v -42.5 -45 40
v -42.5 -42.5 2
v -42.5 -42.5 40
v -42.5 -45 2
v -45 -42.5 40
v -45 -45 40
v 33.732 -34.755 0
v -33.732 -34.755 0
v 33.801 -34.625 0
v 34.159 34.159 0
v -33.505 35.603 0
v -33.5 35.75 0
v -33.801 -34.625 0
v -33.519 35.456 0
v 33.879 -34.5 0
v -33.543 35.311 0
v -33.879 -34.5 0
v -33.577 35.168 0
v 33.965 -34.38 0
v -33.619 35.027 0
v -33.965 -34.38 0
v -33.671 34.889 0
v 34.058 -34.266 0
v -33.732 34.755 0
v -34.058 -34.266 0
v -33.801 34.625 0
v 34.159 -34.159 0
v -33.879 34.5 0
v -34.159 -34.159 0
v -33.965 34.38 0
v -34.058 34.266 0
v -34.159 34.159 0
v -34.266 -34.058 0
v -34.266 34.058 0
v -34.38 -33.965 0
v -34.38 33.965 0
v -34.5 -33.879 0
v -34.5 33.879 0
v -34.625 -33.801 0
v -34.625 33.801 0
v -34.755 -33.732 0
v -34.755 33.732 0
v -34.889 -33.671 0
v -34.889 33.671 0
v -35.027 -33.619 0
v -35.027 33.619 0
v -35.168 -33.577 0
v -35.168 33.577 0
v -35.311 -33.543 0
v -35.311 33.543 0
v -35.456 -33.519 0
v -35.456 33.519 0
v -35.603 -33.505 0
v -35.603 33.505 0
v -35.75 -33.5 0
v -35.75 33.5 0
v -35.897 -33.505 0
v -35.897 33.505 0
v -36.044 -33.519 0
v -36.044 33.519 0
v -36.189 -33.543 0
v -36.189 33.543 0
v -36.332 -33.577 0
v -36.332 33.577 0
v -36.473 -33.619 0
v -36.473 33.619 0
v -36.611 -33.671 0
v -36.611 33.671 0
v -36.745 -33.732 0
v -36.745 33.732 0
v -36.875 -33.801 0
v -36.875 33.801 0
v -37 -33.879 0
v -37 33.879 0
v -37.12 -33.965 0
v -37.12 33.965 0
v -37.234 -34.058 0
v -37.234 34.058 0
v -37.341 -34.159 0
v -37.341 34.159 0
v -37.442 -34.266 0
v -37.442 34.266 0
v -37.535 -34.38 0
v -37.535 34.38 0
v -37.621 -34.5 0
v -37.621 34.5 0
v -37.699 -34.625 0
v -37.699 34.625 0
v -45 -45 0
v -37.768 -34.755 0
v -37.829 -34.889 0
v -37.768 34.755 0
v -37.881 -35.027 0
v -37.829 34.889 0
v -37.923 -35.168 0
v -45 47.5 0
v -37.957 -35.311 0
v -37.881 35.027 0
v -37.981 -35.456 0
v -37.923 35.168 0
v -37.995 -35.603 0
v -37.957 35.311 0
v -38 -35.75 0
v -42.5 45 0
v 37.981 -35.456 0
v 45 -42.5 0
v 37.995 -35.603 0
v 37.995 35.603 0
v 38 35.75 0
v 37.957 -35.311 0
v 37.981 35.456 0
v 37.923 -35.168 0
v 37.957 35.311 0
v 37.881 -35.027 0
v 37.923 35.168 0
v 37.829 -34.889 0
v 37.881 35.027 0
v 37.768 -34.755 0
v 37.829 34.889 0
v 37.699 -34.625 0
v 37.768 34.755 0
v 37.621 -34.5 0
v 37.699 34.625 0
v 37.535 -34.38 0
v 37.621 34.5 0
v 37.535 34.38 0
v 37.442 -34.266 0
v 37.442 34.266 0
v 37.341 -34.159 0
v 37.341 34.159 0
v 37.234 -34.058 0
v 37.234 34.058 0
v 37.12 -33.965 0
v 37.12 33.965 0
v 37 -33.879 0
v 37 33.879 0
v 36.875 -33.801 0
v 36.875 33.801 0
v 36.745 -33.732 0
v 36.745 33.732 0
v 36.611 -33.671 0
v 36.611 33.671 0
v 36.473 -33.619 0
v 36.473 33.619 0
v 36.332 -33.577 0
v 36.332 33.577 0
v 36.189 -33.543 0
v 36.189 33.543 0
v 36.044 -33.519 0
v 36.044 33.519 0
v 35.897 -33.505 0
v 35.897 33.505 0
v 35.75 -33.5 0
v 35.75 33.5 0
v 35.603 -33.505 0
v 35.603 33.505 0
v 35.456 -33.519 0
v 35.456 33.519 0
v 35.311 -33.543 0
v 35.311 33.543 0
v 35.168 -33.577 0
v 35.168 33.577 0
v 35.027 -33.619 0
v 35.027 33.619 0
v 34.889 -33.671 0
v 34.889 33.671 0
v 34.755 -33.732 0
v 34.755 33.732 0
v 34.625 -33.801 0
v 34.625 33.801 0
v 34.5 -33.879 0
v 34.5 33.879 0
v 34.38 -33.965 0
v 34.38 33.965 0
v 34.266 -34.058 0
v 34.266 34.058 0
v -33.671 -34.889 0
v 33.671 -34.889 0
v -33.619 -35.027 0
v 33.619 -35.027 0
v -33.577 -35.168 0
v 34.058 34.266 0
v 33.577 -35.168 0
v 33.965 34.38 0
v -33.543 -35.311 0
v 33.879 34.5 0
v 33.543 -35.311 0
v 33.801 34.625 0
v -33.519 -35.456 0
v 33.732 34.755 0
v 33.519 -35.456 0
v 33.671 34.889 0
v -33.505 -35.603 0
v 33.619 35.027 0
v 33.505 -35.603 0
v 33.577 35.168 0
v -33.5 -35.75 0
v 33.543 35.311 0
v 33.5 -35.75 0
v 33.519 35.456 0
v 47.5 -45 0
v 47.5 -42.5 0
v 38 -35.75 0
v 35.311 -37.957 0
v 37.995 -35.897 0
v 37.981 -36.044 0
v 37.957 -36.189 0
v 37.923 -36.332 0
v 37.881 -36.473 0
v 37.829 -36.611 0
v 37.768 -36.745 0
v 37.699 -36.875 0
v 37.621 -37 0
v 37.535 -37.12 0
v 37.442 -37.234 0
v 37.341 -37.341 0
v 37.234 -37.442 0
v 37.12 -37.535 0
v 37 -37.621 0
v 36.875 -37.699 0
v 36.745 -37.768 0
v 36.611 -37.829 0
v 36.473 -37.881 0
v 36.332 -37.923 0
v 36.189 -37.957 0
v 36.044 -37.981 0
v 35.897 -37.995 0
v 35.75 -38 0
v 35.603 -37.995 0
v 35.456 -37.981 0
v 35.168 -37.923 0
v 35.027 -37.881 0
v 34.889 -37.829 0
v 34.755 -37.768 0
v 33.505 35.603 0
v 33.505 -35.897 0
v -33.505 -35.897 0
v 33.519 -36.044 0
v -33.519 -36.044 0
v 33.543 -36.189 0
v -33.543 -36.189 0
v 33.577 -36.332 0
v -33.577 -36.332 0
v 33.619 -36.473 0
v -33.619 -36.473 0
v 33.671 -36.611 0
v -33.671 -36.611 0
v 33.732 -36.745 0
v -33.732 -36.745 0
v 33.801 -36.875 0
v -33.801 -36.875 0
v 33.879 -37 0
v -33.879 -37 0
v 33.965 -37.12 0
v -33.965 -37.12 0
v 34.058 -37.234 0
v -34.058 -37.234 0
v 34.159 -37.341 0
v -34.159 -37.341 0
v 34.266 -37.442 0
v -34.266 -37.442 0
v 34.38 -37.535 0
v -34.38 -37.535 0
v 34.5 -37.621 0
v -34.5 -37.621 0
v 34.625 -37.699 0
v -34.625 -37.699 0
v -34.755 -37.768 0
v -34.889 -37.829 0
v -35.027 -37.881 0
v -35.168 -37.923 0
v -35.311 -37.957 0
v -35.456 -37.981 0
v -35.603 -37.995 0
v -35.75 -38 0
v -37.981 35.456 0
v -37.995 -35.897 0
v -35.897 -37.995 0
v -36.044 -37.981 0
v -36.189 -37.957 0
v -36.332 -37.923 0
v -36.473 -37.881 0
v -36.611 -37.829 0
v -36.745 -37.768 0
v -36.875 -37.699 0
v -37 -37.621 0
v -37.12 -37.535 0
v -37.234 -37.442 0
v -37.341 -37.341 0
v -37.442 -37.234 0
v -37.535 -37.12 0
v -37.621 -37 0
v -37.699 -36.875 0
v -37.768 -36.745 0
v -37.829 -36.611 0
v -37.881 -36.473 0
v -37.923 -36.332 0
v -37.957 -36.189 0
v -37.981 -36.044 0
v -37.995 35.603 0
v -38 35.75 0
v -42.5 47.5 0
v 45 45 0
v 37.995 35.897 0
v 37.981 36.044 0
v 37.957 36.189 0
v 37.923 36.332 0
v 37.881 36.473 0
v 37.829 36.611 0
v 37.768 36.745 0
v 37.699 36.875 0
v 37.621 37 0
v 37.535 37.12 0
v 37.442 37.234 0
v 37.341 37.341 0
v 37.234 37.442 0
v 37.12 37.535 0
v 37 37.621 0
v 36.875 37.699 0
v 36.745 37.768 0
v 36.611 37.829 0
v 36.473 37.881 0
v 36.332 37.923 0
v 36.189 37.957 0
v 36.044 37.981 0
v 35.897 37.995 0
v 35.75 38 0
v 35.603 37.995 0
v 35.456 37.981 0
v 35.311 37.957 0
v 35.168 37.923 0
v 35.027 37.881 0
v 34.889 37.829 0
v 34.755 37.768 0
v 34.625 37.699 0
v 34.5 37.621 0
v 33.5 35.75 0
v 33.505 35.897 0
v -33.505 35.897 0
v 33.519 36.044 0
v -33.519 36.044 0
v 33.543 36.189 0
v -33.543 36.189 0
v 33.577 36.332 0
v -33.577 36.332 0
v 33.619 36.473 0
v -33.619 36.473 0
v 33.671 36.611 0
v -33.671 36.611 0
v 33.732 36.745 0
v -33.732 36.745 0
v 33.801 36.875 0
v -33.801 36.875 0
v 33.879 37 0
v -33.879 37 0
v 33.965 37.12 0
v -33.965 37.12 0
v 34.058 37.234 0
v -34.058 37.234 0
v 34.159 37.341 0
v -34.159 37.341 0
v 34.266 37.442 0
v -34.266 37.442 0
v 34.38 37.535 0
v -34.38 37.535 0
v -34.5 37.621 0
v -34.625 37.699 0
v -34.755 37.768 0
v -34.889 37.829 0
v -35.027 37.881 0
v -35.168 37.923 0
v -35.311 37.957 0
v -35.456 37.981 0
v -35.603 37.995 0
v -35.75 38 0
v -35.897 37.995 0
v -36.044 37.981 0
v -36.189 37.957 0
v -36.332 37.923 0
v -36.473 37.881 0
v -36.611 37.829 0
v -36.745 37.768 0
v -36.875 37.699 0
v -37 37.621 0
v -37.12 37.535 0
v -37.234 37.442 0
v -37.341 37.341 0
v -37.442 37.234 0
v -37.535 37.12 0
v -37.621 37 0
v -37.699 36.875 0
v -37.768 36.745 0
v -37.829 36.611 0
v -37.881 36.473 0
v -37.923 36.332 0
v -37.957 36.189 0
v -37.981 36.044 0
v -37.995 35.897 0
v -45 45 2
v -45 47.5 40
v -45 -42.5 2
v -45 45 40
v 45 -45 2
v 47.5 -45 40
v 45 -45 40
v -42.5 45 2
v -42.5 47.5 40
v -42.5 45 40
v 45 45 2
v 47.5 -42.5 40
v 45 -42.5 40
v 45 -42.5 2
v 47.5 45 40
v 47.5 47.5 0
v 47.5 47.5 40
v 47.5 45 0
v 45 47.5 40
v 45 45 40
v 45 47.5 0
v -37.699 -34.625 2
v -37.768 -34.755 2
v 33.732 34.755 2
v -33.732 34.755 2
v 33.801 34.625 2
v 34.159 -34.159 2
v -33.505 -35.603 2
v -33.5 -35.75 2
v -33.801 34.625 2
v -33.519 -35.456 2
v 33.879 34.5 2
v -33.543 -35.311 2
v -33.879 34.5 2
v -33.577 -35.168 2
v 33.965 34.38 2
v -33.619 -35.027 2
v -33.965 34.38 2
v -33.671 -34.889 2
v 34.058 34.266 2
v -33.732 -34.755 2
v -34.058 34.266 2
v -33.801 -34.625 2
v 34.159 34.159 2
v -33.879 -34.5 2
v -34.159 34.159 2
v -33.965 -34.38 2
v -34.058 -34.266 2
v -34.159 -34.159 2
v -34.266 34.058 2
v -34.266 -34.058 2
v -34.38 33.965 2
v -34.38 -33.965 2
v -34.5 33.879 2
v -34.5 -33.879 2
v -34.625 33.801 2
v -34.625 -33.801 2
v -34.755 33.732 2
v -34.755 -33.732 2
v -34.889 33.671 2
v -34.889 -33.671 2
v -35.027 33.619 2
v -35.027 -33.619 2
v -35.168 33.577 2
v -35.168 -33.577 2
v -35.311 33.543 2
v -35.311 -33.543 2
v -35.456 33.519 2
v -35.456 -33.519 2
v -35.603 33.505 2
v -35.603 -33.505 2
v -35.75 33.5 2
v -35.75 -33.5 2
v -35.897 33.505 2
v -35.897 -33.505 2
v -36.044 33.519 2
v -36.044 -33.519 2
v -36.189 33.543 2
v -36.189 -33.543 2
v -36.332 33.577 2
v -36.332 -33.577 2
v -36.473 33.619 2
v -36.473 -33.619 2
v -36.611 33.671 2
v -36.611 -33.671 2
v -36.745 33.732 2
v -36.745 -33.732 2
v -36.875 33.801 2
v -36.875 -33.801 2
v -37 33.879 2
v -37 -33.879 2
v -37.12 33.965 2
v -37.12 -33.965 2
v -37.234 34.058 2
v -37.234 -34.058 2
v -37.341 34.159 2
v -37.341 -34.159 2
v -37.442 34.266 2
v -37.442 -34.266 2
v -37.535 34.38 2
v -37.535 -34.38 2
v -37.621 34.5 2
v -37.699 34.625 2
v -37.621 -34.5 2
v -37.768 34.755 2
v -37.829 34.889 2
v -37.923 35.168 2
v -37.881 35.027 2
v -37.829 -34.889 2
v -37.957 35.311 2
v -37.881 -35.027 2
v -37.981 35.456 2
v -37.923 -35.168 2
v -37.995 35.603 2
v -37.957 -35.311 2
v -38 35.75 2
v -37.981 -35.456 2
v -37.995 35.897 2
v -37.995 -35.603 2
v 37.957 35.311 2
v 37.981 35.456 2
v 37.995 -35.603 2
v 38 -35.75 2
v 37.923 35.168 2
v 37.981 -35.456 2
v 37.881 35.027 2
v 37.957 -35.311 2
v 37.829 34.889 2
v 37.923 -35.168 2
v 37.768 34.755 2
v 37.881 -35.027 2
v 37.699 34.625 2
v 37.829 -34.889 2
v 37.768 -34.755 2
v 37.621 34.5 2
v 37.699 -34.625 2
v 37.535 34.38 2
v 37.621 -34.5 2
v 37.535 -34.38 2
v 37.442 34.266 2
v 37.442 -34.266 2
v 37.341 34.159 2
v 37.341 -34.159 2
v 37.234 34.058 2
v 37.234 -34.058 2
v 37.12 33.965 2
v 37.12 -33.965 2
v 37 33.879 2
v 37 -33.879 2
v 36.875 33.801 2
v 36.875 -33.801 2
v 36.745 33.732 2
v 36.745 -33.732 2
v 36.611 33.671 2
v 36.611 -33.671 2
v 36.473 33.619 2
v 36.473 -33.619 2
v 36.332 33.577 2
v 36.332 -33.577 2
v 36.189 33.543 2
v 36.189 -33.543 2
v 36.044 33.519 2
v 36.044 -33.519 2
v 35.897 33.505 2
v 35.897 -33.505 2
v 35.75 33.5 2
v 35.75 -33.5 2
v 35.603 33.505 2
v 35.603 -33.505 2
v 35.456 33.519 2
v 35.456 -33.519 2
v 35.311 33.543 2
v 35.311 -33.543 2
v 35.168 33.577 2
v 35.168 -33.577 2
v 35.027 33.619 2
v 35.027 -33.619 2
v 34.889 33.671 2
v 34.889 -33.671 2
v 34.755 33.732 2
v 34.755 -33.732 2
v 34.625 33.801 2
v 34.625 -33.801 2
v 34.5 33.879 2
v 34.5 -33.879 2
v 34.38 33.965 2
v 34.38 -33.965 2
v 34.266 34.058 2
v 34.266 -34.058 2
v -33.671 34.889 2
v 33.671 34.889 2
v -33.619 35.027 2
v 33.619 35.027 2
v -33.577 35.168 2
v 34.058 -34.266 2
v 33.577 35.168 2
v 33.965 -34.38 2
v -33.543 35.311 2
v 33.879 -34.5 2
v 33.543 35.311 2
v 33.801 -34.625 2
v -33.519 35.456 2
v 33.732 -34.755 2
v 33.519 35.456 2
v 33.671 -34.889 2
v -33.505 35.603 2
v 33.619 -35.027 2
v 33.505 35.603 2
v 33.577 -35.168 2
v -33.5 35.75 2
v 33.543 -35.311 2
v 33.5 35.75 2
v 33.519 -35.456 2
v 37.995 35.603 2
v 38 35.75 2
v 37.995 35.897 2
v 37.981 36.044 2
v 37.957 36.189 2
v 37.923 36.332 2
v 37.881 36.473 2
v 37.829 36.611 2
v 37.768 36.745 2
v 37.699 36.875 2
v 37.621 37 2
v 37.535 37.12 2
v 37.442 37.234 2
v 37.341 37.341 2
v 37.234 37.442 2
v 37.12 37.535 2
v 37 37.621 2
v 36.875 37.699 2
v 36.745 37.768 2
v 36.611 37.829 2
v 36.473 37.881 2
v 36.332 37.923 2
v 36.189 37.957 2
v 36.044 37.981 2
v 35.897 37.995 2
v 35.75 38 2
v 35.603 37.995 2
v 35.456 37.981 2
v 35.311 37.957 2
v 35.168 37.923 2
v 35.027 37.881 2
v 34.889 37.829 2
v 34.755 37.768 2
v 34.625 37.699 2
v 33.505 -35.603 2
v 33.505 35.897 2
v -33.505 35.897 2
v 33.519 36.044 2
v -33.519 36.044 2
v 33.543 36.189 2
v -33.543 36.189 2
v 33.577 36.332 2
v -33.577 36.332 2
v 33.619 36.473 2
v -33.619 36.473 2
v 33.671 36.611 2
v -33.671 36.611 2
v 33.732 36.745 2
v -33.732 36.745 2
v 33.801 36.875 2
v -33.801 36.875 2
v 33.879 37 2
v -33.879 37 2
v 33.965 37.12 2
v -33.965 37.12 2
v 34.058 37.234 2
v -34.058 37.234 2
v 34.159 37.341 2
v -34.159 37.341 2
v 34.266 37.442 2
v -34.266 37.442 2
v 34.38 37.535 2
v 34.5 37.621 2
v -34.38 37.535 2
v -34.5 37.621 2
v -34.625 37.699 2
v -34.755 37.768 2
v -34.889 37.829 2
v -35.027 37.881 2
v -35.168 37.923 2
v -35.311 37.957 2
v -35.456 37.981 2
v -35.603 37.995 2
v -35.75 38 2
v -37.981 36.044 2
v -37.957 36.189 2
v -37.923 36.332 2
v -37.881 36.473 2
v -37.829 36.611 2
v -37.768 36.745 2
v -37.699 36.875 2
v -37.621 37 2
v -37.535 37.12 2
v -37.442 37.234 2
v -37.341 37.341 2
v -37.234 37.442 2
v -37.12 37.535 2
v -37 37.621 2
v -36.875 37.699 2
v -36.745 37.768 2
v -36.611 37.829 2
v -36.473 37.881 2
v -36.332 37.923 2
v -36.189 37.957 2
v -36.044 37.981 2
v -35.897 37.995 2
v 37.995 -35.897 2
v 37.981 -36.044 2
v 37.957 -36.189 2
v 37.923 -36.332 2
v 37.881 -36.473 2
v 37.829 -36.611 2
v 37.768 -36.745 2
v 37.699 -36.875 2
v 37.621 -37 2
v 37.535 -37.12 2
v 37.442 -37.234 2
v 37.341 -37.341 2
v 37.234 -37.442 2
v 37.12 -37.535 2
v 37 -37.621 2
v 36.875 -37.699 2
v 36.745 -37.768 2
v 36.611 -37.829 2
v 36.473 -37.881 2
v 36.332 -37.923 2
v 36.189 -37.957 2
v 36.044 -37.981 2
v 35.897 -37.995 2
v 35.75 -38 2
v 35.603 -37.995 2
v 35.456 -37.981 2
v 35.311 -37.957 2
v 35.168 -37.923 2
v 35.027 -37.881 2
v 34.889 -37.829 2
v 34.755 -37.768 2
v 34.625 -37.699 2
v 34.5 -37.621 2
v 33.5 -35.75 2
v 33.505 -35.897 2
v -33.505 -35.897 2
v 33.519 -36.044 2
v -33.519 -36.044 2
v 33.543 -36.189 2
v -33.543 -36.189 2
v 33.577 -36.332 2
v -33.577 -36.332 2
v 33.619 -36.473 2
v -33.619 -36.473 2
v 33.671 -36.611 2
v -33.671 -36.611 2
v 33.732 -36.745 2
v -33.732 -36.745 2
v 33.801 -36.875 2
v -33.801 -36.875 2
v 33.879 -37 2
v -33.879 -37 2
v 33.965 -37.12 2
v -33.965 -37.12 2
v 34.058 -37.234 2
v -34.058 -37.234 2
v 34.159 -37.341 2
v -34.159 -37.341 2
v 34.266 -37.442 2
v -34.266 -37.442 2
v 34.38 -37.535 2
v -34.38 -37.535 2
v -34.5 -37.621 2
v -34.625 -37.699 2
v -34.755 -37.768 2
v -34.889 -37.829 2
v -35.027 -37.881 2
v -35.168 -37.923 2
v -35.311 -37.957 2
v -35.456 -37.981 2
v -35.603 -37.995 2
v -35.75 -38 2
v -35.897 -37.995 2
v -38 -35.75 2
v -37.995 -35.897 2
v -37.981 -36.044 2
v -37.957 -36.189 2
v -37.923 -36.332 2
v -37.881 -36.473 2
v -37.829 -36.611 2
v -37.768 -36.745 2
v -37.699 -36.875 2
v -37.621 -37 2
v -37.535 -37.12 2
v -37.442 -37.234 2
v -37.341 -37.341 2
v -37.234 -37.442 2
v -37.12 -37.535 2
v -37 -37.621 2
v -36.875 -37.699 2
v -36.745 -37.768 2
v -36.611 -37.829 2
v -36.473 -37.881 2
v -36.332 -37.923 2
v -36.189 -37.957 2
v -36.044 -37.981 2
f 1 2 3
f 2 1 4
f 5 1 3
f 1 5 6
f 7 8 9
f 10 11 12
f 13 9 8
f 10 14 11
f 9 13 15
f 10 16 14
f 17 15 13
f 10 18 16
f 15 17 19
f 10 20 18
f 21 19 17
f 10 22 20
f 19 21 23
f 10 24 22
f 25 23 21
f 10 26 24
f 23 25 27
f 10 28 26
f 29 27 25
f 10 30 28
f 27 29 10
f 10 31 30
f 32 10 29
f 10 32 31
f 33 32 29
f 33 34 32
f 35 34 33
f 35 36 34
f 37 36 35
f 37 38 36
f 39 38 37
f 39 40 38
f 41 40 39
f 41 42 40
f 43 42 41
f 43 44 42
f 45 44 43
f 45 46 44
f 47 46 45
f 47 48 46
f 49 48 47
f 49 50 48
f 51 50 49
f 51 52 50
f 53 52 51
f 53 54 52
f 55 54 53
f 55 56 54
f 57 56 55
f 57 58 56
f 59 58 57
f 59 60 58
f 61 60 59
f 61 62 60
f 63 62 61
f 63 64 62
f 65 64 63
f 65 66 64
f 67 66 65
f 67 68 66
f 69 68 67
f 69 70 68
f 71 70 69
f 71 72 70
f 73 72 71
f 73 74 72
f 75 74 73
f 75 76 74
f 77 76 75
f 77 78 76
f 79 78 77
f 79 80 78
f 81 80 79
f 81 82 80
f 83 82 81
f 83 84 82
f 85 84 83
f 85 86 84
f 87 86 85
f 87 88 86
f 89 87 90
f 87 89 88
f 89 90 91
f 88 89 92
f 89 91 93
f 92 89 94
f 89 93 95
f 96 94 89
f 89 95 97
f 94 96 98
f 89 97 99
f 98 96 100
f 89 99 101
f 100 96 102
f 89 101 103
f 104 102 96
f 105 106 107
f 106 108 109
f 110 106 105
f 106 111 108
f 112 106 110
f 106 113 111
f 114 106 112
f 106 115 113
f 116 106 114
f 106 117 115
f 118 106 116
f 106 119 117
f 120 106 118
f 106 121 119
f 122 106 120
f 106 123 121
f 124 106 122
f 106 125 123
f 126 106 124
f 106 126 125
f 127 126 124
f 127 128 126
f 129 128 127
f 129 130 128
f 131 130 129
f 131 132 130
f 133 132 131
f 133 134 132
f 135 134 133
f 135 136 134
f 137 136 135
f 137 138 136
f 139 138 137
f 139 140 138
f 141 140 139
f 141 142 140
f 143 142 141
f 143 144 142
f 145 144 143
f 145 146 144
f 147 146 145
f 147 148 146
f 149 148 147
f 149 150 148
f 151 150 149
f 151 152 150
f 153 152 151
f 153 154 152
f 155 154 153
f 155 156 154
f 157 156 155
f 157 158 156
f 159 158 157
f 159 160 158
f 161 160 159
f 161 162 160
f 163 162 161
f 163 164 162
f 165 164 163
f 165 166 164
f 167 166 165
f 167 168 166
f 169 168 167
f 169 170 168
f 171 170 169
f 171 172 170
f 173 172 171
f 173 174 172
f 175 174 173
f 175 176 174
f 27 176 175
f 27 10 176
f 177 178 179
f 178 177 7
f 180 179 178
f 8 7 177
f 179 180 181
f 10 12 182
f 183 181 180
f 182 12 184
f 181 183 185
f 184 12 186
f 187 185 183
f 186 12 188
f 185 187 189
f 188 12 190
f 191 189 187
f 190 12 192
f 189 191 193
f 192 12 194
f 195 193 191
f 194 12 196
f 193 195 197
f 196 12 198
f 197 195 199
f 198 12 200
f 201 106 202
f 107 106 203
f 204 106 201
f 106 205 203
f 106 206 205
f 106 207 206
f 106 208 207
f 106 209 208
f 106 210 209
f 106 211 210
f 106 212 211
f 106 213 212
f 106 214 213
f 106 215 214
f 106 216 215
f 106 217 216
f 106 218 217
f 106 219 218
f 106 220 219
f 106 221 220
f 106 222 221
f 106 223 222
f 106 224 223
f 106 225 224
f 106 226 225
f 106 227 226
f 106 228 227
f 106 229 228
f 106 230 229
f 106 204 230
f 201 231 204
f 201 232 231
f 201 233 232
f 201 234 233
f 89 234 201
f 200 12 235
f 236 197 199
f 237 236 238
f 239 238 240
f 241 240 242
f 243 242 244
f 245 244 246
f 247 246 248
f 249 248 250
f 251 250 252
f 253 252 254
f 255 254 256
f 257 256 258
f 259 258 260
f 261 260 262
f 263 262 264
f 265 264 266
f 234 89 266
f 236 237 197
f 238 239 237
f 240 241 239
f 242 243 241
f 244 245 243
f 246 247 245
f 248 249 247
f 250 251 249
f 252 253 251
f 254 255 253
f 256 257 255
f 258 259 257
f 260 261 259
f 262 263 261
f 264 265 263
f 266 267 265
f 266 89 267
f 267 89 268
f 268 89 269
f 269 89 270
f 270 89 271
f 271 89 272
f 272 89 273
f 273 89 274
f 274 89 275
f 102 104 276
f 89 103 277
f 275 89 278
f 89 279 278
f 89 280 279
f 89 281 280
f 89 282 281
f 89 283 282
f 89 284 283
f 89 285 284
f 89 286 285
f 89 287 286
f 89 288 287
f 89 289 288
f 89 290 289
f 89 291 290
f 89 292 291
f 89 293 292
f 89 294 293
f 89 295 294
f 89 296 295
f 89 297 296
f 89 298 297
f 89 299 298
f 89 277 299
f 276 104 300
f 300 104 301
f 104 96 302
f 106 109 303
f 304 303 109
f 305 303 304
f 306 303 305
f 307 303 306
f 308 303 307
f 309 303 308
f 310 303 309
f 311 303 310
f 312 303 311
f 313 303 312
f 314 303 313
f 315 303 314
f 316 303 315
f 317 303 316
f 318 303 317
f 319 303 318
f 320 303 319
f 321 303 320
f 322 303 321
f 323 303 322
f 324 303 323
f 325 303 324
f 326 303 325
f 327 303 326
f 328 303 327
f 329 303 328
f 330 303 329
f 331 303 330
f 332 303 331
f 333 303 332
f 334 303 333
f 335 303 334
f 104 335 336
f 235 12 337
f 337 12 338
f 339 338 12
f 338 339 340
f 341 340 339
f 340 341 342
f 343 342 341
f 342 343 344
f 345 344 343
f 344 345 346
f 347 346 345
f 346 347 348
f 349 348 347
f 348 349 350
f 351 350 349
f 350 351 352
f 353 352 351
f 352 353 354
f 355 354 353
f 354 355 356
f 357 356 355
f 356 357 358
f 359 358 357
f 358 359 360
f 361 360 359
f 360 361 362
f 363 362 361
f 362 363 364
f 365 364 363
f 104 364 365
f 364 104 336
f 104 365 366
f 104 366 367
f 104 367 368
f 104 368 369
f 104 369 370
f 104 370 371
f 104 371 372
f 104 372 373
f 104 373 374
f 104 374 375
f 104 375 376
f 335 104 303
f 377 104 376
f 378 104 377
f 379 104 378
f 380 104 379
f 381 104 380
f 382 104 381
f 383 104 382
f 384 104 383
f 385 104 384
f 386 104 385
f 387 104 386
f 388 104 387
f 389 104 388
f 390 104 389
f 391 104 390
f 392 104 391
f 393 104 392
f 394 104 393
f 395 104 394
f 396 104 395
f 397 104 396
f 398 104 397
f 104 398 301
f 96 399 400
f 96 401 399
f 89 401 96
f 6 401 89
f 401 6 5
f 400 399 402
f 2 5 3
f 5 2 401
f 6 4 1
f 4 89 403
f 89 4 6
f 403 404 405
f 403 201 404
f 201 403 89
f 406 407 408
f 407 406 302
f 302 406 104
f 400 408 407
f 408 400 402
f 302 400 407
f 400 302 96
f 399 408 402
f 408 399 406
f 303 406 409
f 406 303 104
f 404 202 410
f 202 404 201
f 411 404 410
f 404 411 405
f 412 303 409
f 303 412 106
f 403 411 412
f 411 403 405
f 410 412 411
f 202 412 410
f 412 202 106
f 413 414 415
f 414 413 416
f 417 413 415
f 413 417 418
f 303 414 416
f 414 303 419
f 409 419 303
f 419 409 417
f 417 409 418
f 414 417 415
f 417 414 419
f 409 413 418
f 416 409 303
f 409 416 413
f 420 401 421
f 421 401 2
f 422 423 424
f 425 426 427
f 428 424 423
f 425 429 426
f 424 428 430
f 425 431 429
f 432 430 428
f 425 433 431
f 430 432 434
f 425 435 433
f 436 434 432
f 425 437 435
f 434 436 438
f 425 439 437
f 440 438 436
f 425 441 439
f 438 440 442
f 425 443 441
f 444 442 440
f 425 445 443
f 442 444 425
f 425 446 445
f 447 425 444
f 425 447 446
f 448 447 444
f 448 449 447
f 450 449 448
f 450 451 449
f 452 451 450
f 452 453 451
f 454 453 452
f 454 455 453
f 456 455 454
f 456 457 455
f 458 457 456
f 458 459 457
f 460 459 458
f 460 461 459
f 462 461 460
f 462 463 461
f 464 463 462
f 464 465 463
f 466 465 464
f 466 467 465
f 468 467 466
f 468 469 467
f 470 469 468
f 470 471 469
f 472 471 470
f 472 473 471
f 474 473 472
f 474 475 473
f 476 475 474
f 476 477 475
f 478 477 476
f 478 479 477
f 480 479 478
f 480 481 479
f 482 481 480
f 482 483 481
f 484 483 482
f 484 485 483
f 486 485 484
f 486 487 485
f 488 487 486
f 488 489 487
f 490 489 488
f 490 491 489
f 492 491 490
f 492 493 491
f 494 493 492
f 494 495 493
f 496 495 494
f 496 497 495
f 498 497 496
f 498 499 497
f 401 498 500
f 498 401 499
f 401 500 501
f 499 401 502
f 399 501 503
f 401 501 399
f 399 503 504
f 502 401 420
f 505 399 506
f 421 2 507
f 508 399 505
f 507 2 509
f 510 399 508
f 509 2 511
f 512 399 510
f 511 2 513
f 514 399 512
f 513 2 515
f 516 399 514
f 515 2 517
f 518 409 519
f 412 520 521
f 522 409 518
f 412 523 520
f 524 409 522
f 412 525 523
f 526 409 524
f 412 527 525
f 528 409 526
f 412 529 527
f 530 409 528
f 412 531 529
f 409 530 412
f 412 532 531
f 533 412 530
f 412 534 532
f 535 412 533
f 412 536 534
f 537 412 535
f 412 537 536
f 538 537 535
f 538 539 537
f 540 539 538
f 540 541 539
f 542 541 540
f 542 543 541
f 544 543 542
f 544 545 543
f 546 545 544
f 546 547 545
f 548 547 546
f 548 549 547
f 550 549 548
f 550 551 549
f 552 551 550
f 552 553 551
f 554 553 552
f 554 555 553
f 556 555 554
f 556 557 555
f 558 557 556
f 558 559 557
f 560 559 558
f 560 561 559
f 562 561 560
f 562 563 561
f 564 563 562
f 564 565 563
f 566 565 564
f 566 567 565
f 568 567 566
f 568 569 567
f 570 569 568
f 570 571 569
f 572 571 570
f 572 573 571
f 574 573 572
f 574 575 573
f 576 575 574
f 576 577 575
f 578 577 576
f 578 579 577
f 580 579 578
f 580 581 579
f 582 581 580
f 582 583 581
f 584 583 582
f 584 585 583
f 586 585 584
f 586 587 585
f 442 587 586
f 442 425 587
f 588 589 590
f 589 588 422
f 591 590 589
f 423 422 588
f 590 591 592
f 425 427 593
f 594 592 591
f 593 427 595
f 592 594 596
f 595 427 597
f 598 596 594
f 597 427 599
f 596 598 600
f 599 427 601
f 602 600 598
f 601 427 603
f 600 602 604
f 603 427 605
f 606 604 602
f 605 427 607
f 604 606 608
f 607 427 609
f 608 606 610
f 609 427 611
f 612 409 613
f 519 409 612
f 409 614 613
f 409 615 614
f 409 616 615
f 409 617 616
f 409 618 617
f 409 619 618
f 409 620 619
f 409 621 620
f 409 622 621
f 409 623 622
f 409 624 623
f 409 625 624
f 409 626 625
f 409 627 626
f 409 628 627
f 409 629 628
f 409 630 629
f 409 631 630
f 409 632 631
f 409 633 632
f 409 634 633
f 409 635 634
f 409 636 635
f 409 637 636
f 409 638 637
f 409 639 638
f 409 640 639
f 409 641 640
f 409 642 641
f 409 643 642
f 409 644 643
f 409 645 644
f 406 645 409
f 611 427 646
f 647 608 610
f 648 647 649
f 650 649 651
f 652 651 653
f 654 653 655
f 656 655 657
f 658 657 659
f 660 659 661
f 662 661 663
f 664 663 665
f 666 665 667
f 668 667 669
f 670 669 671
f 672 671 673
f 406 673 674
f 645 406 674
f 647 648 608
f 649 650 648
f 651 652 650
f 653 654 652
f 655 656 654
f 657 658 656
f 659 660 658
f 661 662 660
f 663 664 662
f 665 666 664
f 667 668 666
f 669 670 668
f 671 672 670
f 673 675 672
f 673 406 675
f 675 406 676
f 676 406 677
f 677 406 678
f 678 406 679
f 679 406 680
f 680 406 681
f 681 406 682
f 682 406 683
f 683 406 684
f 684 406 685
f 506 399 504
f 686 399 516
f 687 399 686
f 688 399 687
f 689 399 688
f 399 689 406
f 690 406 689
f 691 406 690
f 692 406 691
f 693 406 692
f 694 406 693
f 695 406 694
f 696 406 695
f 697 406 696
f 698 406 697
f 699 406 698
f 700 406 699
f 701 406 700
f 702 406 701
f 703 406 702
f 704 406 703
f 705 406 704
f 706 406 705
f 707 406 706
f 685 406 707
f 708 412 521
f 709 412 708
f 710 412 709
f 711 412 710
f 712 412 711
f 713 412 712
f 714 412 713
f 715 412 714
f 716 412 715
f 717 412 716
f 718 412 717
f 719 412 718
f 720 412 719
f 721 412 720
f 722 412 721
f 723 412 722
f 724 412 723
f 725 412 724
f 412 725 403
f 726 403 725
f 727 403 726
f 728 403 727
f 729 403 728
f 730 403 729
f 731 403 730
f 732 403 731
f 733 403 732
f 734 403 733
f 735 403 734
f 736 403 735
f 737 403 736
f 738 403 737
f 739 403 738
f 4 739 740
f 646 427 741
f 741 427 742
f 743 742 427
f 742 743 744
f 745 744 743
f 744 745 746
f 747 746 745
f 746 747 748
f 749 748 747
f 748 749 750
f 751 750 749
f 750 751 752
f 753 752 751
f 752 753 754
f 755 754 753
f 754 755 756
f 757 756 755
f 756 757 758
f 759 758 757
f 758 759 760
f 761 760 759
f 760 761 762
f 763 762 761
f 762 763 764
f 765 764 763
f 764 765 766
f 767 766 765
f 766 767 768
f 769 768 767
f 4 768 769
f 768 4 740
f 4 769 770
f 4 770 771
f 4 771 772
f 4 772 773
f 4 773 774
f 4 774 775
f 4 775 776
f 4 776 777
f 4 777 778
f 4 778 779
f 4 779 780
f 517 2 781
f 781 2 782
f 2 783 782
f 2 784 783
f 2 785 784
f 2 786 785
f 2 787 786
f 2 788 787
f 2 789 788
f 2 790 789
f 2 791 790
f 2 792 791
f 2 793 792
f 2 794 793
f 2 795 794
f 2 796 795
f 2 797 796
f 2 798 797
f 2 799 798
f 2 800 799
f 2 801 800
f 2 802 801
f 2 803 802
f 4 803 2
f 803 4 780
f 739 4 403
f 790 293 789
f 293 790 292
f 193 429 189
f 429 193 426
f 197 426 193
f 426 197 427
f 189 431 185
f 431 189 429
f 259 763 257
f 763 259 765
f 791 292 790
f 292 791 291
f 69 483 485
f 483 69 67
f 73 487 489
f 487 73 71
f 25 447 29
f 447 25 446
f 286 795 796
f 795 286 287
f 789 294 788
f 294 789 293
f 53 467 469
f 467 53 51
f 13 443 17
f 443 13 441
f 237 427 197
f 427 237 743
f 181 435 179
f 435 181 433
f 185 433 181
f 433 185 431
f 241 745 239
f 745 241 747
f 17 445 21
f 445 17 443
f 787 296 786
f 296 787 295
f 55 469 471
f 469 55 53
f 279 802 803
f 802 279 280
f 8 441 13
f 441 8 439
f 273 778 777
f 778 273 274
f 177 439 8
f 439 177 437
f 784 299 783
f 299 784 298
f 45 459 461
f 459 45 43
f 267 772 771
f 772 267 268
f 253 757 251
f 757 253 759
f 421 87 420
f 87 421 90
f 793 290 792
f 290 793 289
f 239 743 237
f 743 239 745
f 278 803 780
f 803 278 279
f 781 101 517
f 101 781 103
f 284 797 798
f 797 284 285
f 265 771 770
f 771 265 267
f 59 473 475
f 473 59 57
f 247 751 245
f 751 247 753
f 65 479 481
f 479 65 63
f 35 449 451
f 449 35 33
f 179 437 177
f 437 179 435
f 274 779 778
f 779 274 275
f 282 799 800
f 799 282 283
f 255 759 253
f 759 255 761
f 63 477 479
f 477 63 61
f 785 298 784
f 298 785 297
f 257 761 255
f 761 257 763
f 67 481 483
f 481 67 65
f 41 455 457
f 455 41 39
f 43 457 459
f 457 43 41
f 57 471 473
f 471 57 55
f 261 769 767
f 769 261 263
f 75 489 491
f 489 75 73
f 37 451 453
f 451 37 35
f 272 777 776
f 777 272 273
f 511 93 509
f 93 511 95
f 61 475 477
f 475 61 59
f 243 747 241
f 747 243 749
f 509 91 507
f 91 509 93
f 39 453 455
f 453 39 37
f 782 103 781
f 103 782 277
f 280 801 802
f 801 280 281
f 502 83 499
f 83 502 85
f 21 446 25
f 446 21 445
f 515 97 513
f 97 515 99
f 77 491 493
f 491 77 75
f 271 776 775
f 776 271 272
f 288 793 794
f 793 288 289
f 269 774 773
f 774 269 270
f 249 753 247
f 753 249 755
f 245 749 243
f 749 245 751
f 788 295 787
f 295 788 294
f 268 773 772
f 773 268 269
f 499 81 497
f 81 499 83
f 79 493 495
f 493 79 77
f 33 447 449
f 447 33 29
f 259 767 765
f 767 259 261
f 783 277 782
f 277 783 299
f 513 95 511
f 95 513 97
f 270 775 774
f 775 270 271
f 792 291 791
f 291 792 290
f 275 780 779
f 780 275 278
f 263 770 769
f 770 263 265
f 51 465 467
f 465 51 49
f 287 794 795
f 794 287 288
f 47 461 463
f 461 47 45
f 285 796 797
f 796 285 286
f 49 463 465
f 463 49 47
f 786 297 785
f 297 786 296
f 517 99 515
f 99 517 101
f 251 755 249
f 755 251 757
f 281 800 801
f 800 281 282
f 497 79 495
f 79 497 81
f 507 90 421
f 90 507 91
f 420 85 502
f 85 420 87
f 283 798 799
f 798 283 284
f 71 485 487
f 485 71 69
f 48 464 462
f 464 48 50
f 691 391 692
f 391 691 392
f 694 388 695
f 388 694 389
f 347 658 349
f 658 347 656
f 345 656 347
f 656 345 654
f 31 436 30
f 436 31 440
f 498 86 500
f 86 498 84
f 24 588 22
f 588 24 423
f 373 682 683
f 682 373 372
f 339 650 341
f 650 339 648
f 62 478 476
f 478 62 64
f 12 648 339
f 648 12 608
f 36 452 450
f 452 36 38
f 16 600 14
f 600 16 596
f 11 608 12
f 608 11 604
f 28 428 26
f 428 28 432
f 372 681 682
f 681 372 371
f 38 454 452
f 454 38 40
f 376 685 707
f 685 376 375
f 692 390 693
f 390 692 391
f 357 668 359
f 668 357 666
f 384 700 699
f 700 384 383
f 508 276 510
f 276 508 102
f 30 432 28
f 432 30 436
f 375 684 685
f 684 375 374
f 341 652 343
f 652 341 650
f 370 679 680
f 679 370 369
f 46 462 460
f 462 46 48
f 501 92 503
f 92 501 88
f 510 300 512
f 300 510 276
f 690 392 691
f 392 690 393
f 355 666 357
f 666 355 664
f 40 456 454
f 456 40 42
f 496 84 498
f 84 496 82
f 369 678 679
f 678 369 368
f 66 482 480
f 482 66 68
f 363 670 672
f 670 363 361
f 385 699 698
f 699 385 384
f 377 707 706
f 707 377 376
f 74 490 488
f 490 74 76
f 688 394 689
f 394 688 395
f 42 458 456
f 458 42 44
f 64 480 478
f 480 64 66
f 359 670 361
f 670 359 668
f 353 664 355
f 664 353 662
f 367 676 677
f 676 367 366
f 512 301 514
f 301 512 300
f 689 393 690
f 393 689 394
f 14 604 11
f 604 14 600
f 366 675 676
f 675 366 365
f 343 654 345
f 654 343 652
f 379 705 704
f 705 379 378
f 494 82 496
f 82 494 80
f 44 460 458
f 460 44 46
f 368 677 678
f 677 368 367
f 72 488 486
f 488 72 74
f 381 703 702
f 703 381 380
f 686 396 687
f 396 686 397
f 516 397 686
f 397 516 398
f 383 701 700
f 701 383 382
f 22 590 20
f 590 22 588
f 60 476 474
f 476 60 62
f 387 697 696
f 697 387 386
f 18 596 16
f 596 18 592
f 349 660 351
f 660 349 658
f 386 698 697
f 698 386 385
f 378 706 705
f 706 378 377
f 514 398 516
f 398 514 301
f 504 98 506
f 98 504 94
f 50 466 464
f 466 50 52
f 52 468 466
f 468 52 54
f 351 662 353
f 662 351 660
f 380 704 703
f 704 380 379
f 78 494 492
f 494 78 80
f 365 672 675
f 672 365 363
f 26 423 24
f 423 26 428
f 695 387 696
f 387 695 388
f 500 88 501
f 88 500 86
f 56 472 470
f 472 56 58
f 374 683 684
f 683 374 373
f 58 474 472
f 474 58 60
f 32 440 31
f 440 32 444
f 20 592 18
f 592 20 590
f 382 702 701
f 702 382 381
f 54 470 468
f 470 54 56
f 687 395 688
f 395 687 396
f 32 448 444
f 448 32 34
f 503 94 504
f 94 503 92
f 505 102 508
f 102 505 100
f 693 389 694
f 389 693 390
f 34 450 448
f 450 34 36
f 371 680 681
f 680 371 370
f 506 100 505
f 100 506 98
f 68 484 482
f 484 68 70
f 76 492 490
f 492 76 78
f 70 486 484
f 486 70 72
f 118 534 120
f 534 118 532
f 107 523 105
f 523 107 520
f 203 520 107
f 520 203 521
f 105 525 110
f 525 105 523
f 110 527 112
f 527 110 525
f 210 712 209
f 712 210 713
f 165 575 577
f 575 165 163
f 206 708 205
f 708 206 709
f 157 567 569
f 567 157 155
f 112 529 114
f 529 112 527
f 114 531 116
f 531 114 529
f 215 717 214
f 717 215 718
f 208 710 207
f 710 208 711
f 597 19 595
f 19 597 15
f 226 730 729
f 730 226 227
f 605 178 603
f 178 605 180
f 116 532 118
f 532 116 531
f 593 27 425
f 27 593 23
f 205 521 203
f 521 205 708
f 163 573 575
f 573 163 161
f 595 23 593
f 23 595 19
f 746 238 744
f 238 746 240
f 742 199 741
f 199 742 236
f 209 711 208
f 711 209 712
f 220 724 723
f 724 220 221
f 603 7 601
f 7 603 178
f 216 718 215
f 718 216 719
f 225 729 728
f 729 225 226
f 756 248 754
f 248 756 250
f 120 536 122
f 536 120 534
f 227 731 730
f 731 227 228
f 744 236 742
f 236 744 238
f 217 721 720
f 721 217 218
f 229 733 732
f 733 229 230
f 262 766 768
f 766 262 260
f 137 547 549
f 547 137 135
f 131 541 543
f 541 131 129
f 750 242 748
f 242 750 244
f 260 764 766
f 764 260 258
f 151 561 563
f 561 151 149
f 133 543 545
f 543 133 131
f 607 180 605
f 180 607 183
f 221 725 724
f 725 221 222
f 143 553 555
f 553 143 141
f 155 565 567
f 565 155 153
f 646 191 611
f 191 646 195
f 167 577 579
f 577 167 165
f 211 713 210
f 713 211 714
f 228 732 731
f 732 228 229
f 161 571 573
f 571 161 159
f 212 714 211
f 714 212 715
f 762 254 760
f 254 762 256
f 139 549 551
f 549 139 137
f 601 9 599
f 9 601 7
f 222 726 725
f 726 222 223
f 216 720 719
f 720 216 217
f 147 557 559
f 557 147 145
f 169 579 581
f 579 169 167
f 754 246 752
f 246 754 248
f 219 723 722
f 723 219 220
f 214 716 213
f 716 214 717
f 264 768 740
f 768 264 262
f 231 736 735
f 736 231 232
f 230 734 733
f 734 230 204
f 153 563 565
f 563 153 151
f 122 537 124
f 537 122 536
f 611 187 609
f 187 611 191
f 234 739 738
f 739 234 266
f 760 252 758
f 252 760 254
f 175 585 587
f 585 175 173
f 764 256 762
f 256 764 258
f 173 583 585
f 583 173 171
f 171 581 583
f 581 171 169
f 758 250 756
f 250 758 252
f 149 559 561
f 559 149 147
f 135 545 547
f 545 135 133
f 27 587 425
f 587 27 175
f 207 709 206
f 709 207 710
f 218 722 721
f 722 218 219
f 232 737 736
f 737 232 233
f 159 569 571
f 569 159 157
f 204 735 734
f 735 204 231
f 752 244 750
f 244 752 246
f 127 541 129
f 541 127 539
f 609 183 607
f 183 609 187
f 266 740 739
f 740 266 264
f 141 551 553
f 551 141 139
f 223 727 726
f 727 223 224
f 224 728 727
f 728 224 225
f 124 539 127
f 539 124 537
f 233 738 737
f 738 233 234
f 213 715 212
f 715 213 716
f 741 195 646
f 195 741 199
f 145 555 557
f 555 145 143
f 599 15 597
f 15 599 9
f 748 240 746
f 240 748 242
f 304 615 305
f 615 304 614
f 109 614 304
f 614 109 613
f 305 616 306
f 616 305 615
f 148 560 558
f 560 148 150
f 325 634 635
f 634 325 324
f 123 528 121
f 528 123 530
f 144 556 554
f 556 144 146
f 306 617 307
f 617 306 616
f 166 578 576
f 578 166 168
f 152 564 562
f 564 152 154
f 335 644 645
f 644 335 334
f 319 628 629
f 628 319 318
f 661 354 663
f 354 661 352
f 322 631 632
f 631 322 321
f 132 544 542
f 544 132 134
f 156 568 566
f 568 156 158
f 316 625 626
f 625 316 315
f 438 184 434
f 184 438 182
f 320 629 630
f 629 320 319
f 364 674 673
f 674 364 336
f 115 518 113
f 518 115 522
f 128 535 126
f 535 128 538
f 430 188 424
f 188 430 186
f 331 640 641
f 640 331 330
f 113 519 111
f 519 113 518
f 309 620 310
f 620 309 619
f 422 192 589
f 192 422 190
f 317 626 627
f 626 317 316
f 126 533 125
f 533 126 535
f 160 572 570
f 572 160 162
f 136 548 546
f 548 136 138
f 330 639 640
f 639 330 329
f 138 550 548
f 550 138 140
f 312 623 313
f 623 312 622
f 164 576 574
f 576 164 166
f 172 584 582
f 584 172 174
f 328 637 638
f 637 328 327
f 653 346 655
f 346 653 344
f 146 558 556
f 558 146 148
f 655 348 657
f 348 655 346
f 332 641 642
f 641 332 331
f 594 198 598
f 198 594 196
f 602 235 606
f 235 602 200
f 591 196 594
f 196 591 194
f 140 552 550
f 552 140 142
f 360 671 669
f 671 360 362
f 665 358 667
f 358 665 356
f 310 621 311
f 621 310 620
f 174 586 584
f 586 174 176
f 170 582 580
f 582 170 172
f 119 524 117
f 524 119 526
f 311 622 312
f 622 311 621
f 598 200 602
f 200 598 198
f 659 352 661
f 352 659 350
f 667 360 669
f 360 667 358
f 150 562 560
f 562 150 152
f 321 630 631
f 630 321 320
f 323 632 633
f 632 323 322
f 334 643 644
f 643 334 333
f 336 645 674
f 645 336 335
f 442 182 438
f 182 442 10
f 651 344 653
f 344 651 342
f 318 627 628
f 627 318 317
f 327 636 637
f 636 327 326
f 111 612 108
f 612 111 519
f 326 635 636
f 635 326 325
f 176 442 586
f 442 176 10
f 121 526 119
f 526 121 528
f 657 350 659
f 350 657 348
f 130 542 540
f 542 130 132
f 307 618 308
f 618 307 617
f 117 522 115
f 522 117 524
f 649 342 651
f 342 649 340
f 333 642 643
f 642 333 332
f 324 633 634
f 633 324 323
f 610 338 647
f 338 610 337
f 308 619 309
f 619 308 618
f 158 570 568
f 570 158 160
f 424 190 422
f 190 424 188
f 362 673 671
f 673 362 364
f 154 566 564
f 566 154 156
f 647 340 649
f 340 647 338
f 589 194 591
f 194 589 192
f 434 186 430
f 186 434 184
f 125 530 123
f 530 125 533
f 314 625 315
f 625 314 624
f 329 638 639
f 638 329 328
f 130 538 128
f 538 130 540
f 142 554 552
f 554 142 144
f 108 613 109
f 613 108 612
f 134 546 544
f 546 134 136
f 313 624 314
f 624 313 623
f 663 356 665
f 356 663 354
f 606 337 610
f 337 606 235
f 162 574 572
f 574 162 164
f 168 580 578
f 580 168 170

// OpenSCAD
// Magnetic stirrer housing (print orientation: upside down)
// Units: mm

// ---------- Parameters ----------
top_thickness      = 2;     // top plate thickness (z = 0 to 2)
wall_thickness     = 2.5;   // wall thickness
wall_height        = 40;    // total height of walls (z = 0 to 40)
outer_size         = 90;    // outer size in X and Y
hole_diameter      = 4.5;   // M4 screw hole diameter
hole_pattern_size  = 71.5;  // square pitch of screw holes
notch_width        = 12;    // cable notch width
notch_depth        = 8;     // cable notch depth from open edge (z = 32 to 40)
overcut            = 0.5;   // extra length for cutting shapes
$fn                = 96;    // curve resolution

// ---------- Model ----------
difference() {
    union() {
        // Top plate
        translate([-outer_size/2, -outer_size/2, 0])
            cube([outer_size, outer_size, top_thickness]);

        // Four walls, open at the top
        for (x = [-outer_size/2, outer_size/2])
            for (y = [-outer_size/2, outer_size/2])
                translate([x, y, 0])
                    cube([wall_thickness, wall_thickness, wall_height]);
    }

    // Screw holes through the top plate
    for (dx = [-hole_pattern_size/2, hole_pattern_size/2])
        for (dy = [-hole_pattern_size/2, hole_pattern_size/2])
            translate([dx, dy, -overcut])
                cylinder(d = hole_diameter, h = top_thickness + 2*overcut);

    // Cable notch in one wall (x = -45, centred along the wall)
    translate([-outer_size/2, -wall_thickness/2, wall_height - notch_depth])
        cube([wall_thickness + overcut, notch_width, notch_depth + overcut]);
}
